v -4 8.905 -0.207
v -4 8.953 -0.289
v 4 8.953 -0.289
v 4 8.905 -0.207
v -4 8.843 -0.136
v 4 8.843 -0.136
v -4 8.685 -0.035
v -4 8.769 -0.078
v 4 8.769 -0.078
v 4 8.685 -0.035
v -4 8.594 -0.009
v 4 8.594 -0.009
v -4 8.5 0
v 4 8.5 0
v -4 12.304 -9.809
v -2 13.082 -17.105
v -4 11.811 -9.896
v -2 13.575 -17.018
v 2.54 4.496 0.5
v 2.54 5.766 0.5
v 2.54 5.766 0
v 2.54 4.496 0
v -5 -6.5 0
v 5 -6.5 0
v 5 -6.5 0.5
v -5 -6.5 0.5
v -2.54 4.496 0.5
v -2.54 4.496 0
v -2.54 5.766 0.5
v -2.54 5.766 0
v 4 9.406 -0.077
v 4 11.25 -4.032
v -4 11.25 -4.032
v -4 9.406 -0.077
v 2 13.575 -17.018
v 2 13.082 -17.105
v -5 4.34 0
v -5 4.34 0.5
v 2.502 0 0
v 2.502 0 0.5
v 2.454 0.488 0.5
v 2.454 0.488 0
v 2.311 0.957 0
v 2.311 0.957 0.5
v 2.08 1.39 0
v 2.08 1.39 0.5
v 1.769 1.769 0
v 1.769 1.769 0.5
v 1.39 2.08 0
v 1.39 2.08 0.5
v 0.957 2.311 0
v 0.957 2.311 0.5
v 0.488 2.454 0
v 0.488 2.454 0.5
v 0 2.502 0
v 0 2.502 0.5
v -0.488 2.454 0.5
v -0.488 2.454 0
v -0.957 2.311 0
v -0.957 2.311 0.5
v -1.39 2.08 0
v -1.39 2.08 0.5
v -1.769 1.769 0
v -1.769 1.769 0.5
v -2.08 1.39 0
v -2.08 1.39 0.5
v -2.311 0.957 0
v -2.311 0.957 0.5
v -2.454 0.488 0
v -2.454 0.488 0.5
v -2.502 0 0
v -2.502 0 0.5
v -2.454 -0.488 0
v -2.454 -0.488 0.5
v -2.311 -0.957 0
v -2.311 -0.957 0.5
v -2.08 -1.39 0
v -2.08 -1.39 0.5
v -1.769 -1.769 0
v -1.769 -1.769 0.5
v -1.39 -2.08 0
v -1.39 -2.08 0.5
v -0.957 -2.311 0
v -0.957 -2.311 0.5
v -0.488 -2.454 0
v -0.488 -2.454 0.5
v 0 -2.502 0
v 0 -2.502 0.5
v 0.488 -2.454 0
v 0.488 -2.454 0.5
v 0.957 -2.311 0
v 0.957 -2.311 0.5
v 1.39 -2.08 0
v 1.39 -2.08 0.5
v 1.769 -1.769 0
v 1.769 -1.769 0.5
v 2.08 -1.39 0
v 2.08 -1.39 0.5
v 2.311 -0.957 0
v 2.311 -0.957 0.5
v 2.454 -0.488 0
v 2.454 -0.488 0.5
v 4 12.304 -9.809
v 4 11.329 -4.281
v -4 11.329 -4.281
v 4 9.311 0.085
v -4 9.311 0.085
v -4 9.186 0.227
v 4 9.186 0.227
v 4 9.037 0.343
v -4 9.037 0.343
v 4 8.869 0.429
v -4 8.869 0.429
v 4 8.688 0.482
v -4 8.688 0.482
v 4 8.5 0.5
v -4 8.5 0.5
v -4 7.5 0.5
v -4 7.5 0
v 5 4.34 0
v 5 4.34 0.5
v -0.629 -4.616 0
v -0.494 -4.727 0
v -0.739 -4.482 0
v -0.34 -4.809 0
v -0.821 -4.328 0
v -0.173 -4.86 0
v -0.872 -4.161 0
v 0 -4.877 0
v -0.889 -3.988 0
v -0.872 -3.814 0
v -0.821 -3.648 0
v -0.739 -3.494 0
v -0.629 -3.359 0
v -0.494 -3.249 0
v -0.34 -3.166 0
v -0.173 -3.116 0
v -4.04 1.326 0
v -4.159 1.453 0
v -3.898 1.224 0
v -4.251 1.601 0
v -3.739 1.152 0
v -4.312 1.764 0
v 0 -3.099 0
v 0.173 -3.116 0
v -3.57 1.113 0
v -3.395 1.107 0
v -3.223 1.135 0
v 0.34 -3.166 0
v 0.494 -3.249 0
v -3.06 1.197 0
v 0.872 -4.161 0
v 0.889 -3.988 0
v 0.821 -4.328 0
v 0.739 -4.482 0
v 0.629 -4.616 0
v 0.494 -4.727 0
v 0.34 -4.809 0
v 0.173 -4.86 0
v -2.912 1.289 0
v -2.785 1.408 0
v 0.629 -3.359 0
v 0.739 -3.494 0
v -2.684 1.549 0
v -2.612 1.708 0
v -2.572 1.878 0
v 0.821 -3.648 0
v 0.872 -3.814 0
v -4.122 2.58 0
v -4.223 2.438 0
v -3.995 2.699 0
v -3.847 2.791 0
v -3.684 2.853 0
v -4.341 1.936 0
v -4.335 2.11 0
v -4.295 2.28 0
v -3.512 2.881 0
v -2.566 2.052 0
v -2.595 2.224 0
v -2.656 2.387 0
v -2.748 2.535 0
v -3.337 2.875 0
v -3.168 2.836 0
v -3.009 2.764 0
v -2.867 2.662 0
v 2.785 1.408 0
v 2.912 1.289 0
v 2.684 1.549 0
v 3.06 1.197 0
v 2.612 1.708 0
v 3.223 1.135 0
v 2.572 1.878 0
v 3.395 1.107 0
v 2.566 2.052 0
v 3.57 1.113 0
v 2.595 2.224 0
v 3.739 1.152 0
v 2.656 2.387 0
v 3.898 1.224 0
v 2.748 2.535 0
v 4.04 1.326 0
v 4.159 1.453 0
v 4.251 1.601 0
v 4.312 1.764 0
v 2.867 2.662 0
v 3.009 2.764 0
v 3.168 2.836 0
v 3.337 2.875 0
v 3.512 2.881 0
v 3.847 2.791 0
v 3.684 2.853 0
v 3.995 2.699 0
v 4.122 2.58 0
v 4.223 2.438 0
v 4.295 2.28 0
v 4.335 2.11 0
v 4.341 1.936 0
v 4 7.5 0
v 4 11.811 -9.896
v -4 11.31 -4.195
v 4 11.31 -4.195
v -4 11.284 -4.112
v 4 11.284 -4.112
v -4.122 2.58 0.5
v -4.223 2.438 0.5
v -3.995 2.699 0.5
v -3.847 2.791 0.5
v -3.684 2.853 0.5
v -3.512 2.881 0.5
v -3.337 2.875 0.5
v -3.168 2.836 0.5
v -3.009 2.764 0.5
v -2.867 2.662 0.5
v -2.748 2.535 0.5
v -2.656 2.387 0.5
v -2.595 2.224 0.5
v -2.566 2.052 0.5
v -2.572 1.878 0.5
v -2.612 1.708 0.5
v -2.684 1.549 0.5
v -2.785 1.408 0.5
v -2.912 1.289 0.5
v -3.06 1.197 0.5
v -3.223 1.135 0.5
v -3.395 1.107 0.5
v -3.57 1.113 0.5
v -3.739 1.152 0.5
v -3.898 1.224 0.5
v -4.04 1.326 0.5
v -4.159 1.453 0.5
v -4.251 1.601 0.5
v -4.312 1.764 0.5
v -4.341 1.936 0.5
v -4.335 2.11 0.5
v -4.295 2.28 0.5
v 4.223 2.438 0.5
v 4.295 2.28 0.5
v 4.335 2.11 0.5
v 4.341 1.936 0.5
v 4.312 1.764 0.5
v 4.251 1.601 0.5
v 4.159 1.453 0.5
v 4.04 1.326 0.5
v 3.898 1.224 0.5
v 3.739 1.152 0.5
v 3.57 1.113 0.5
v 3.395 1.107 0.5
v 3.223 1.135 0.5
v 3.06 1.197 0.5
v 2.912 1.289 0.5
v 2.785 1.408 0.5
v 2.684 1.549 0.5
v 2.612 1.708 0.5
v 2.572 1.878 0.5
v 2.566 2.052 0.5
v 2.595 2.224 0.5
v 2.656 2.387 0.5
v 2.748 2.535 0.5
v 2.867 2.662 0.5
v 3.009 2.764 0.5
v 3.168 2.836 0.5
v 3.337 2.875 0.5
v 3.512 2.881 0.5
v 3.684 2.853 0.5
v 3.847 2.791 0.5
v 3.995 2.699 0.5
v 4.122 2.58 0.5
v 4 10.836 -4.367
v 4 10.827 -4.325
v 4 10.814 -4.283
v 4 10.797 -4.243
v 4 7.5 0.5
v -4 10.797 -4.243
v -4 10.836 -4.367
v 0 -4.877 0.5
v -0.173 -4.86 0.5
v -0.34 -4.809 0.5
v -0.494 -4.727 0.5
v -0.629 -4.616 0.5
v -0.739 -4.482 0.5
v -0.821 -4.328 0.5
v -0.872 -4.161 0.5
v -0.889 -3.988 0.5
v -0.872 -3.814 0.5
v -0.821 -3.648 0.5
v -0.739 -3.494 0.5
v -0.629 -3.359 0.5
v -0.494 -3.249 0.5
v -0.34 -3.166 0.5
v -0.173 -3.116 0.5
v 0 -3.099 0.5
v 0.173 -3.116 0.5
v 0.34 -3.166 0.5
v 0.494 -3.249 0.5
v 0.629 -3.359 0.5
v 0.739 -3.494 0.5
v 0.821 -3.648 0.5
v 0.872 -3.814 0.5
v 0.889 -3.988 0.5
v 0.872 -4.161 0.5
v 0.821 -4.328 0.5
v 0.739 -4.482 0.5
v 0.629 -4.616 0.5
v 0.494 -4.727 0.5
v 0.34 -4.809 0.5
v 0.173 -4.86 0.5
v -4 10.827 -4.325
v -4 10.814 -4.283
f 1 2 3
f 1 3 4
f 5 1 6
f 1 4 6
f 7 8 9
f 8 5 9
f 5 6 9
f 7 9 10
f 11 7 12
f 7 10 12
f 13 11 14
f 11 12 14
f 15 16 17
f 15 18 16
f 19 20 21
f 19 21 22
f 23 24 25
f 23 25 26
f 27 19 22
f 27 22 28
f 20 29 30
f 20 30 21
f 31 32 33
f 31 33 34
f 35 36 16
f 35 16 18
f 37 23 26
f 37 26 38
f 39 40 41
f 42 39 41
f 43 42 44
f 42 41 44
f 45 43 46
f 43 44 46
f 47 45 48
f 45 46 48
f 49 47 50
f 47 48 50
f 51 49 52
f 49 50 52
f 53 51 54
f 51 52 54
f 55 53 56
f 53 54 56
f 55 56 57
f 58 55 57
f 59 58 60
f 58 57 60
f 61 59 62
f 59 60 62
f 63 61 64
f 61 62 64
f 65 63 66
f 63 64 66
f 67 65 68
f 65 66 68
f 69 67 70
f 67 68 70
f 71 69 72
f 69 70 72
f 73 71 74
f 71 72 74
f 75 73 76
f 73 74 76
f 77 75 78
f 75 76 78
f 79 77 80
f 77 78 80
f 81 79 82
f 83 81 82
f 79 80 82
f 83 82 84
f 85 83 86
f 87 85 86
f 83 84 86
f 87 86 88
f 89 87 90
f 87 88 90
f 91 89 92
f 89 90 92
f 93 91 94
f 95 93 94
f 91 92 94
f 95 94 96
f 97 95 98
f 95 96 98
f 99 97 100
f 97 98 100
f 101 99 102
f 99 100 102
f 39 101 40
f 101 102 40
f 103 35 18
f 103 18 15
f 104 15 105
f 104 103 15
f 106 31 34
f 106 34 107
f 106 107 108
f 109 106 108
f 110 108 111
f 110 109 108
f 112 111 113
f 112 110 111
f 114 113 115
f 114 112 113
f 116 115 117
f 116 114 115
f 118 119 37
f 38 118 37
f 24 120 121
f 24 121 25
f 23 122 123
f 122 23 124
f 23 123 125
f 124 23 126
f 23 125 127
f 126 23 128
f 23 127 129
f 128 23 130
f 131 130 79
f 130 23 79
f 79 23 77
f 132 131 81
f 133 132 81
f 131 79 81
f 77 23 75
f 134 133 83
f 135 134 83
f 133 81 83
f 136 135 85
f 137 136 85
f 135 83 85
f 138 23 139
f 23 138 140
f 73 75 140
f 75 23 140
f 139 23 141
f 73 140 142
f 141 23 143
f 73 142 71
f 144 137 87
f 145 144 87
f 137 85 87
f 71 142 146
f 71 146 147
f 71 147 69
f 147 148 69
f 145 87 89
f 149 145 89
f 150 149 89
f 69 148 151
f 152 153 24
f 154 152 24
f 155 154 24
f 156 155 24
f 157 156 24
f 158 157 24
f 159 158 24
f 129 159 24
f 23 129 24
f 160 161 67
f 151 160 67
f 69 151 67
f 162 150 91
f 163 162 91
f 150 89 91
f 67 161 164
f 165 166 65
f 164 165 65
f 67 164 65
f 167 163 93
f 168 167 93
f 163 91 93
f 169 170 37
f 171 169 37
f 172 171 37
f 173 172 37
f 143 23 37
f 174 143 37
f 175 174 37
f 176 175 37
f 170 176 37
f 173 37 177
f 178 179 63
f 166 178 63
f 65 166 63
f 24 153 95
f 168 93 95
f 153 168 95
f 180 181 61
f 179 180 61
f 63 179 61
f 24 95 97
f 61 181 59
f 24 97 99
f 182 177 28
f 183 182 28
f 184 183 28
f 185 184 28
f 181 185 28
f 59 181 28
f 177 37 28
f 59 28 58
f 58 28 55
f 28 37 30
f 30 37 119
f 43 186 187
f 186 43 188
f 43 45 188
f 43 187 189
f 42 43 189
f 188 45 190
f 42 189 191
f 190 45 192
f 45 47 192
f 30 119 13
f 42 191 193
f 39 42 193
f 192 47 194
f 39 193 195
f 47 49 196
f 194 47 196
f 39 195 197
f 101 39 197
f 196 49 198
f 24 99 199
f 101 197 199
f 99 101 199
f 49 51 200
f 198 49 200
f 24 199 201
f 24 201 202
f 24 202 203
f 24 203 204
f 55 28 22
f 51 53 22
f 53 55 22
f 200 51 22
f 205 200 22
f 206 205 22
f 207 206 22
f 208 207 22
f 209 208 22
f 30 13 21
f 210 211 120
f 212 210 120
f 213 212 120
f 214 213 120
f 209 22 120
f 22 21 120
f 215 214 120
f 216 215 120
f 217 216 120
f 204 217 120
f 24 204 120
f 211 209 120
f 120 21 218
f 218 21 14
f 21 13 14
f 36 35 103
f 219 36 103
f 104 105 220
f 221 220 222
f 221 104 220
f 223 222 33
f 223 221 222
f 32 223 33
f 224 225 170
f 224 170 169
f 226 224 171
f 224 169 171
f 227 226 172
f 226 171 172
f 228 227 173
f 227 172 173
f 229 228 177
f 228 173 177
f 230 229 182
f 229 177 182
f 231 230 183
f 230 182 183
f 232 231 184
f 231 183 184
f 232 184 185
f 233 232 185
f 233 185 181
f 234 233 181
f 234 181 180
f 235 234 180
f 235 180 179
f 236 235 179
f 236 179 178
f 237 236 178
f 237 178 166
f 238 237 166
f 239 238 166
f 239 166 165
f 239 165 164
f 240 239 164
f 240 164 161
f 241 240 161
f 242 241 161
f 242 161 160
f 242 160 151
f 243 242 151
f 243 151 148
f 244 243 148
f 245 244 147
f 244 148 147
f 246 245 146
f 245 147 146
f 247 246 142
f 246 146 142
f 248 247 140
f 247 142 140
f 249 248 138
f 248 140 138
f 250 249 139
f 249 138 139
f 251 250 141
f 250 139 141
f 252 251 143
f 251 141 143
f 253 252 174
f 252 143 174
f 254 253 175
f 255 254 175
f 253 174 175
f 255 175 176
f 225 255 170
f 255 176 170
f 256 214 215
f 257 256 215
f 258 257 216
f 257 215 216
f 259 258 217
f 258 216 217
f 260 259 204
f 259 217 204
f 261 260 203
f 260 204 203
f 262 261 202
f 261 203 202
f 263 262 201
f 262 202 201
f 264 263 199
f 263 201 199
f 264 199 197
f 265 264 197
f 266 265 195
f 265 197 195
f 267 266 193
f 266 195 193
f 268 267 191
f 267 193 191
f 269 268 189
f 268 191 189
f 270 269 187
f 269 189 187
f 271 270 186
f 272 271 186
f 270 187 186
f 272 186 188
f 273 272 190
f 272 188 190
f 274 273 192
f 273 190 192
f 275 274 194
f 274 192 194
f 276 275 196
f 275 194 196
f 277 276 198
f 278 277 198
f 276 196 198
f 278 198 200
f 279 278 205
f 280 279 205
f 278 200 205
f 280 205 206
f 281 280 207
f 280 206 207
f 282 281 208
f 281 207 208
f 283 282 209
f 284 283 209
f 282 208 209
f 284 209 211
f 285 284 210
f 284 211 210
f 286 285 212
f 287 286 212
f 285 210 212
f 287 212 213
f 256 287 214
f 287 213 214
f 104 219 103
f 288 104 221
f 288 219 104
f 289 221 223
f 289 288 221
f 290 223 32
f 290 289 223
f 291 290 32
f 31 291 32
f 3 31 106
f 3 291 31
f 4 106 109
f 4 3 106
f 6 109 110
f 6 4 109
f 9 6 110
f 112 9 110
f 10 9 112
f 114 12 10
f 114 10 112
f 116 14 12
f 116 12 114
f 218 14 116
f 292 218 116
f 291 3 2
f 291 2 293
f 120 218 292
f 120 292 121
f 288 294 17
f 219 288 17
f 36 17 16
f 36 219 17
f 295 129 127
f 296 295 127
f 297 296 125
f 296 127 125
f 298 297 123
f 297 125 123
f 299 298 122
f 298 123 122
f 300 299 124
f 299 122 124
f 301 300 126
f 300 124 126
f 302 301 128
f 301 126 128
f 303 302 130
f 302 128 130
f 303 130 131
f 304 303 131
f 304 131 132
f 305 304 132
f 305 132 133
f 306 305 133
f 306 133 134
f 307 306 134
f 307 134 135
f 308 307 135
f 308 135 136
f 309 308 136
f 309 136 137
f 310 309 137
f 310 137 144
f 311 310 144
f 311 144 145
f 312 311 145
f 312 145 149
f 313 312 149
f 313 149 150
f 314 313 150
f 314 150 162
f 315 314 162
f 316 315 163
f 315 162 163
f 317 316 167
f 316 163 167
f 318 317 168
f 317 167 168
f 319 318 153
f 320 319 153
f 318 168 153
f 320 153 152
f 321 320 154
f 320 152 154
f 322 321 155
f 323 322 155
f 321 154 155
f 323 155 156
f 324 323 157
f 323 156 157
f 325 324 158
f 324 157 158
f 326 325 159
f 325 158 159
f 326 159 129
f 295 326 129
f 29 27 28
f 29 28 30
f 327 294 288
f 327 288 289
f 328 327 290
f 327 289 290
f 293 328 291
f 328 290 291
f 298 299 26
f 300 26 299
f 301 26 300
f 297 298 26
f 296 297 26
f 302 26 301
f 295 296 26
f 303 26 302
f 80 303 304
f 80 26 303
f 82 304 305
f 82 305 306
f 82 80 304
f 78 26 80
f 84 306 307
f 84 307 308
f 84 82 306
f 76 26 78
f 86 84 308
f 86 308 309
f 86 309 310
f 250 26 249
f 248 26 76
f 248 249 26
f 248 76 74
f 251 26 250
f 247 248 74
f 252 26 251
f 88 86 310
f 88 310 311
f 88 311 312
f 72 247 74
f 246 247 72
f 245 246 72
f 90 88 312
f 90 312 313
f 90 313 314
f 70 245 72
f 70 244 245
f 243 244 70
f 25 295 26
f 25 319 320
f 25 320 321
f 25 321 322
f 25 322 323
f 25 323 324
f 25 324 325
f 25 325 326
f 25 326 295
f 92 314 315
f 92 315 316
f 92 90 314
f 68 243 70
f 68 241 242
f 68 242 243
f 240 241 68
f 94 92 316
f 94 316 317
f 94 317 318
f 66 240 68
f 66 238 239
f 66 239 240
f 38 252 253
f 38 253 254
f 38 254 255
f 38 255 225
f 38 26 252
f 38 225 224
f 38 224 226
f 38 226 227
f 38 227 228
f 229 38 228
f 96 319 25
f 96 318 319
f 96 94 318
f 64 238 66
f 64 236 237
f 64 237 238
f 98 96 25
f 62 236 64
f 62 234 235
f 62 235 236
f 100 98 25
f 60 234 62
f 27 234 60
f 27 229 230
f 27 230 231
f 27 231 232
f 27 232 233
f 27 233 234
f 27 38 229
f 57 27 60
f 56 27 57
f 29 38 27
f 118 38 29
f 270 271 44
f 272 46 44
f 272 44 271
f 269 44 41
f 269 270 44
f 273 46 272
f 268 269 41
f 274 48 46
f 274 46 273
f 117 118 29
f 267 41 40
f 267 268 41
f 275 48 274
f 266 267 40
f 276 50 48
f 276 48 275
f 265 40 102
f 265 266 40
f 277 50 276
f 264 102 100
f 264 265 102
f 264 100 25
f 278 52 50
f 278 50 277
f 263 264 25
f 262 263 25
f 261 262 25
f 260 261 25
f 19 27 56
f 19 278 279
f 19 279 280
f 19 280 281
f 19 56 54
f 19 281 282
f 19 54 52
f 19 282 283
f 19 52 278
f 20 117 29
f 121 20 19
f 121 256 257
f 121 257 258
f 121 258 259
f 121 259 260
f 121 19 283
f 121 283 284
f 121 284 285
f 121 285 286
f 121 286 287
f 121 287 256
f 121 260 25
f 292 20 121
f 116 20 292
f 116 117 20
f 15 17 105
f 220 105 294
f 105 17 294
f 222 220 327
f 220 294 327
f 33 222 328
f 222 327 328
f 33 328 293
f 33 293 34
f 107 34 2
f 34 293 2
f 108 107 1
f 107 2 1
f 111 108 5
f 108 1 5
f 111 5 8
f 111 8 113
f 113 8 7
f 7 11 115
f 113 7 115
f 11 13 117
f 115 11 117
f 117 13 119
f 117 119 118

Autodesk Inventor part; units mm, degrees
ref_plane "YZ Plane" through (0, 0, 0) normal (1, 0, 0) x (0, 1, 0)
ref_plane "XZ Plane" through (0, 0, 0) normal (0, 1, 0) x (-1, 0, 0)
ref_plane "XY Plane" through (0, 0, 0) normal (0, 0, 1) x (1, 0, 0)
sketch "Sketch1" plane through (0, 0, 0) normal (0, 0, 1) x (1, 0, 0)
  line L0 (0, -9.5) -> (0, 11.5)
  line L1 (-4, 7.5) -> (4, 7.5)
  line L2 (4, 7.5) -> (4, 2.1599)
  line L3 (4, 2.1599) -> (-4, 2.1599)
  line L4 (-4, 2.1599) -> (-4, 7.5)
  line L5 (-7, 0) -> (7, 0)
  line L6 (-4, 7.5) -> (-5, 4.34)
  line L7 (4, 7.5) -> (5, 4.34)
  line L8 (-4, 4.34) -> (4, 4.34)
  line L9 (-5, -6.5) -> (-5, 4.34)
  line L10 (5, 4.34) -> (5, -6.5)
  line L11 (5, -6.5) -> (-5, -6.5)
  line L12 (-4, 7.5) -> (4, 7.5)
  line L13 (4, 7.5) -> (4, 8.5)
  line L14 (4, 8.5) -> (-4, 8.5)
  line L15 (-4, 8.5) -> (-4, 7.5)
  point P0 (0, 7.5)
  point P1 (0, 0)
  dimension "d6" = 8
  dimension "d9" = 10.84
  dimension "d40" = 7.5
  dimension "d41" = 8.5
extrude "Plate1" add sketch "Sketch1" along normal blind 0.5
sketch "Sketch2" plane through (0, 0, 0.5) normal (0, 0, 1) x (1, 0, 0)
  circle A0 centre (0, 0) radius 2.5019
  line L0 (0, -9.5) -> (0, 11.5) projected
  point P0 (0, -3.9878)
  dimension "d12" = 5.0038
  dimension "d69" = 3.9878
extrude "Cut1" cut sketch "Sketch2" against normal blind 0.5
hole "Hole1" at (0, -3.9878, 0.5) direction (0, 0, -1) diameter 1.778 end through all clearance for "Flat Head Machine Screw (82)" size "#0" standard "Ansi Unified Screw Threads"
pattern_circular "Circular Pattern1" count 3 over 360 about axis through (0, 0, -10) along (0, 0, 1) of "Hole1"
sketch "Sketch3" plane through (0, 0, 0.5) normal (0, 0, 1) x (1, 0, 0)
  circle A0 centre (0, 0) radius 2.5019 projected
  line L0 (-2.5, 5.334) -> (2.5, 5.334)
  line L1 (2.5, 5.334) -> (2.5, 4.572)
  line L2 (2.5, 4.572) -> (-2.5, 4.572)
  line L3 (-2.5, 4.572) -> (-2.5, 5.334)
  point P0 (0, 5.334)
  dimension "d25" = 5
  dimension "d26" = 0.762
  dimension "d27" = 5.334
cut "Cut2" [suppressed]
sketch "Sketch5" plane through (4, 8.9532, -0.2887) normal (0, 0.9063078, 0.4226183) x (-1, 0, 0)
  line L0 (8, 0) -> (0, 0)
  line L1 (0, 0) -> (0, -4.3629)
  line L2 (0, -4.3629) -> (8, -4.3629)
  line L3 (8, -4.3629) -> (8, 0)
edge flange "Flange2" height 5 angle 65 thickness 0.5 bend radius 0.5 thickness toward (0, 0.9063078, 0.4226183) relief tear relief width 0.5 relief depth 0.25 edges at (0, 8.5, 0) wall of the first edge with corners at (-4, 8.9532, -0.2887) (4, 8.9532, -0.2887) (4, 10.797, -4.2428) (-4, 10.797, -4.2428)
bend "Bend2"
corner "Corner2"
sketch "Sketch6" plane through (-4, 10.8363, -4.3673) normal (0, 0.9848078, 0.1736482) x (1, 0, 0)
  line L0 (8, 0) -> (0, 0)
  line L1 (0, 0) -> (0, -12.9342)
  line L2 (0, -12.9342) -> (8, -12.9342)
  line L3 (8, -12.9342) -> (8, 0)
edge flange "Flange3" height 13 angle -15 thickness 0.5 bend radius 0.5 thickness toward (0, 0.9848078, 0.1736482) relief tear relief width 0.5 relief depth 0.25 edges at (0, 11.2502, -4.0315) wall of the first edge with corners at (4, 10.8363, -4.3673) (-4, 10.8363, -4.3673) (-4, 13.0823, -17.105) (4, 13.0823, -17.105)
bend "Bend3"
corner "Corner3"
sketch "Sketch8" plane through (-4, 13.5747, -17.0182) normal (0, 0.9848078, 0.1736482) x (1, 0, 0)
  line L0 (0, -12.9342) -> (8, -12.9342) projected
  line L1 (8, -12.9342) -> (8, 0) projected
  line L2 (8, 0) -> (0, 0) projected
  line L3 (0, -12.9342) -> (0, 0) projected
  line L4 (2, 0) -> (6, 0)
  line L5 (6, 0) -> (6, -10.36)
  line L6 (6, -10.36) -> (2, -10.36)
  line L7 (2, -10.36) -> (2, 0)
  line L8 (4, 5.07) -> (4, -29.8212) projected
  line L9 (2, 0) -> (0, -7.32)
  line L10 (6, 0) -> (8, -7.32)
  line L11 (0, -7.32) -> (0, 0)
  line L12 (2, 0) -> (0, 0)
  line L13 (6, 0) -> (8, 0)
  line L14 (8, -7.32) -> (8, 0)
  point P0 (4, -19.1169)
  point P1 (4, 0)
  point P2 (4, 0)
  dimension "d63" = 4
  dimension "d64" = 7.32
  dimension "d65" = 12.9342
extrude "Cut3" cut sketch "Sketch8" against normal blind 0.5 contours L3 L2 L9 | L10 L2 L1
sketch "Sketch9" plane through (5, -6.5, 0) normal (1, 0, 0) x (0, 0, -1)
  line L0 (-0.5, 10.84) -> (-0.5, 0) projected
  line L1 (0, 0) -> (-0.5, 0) projected
  line L2 (0, 0) -> (0, 10.84) projected
  line L3 (0, 10.84) -> (-0.5, 10.84) projected
  line L4 (0.0774, 15.9063) -> (0.2887, 15.4532) projected
  arc A0 (0.0774, 15.9063) -> (-0.5, 15) centre (0.5, 15) ccw projected
  line L5 (0, 15) -> (-0.5, 15) projected
  arc A1 (0.2887, 15.4532) -> (0, 15) centre (0.5, 15) ccw projected
  line L6 (0, 14) -> (0, 15) projected
  line L7 (4.2805, 17.8287) -> (4.3673, 17.3363) projected
  arc A2 (4.2805, 17.8287) -> (4.0315, 17.7502) centre (4.4542, 16.8439) ccw projected
  line L8 (4.2428, 17.297) -> (4.0315, 17.7502) projected
  arc A3 (4.3673, 17.3363) -> (4.2428, 17.297) centre (4.4542, 16.8439) ccw projected
  line L9 (-0.5, 15) -> (15.0848, 17.748)
  line L10 (0.0774, 15.9063) -> (4.0315, 17.7502)
  point P0 (0, 6.5)
sketch "Sketch10" plane through (0, 0, 0.5) normal (0, 0, 1) x (1, 0, 0)
  circle A0 centre (0, 0) radius 2.5019 projected
  line L0 (-2.54, 5.7658) -> (2.54, 5.7658)
  line L1 (2.54, 5.7658) -> (2.54, 4.4958)
  line L2 (2.54, 4.4958) -> (-2.54, 4.4958)
  line L3 (-2.54, 4.4958) -> (-2.54, 5.7658)
  point P0 (0, 5.7658)
  dimension "d70" = 1.27
  dimension "d71" = 5.08
  dimension "d72" = 4.4958
extrude "Cut4" cut sketch "Sketch10" against normal blind 0.5 contours L0 L1 L2 L3
equation "\"d13\" = Thickness"
equation "\"d20\" = Thickness"
equation "\"d28\" = Thickness"
equation "\"d66\" = Thickness"
equation "\"d73\" = Thickness"
equation "\"d42\" = BendReliefWidth"
equation "\"d43\" = BendReliefDepth"
equation "\"d44\" = MinimumRemnant"
equation "\"d45\" = BendRadius"
equation "\"d48\" = BendRadius"
equation "\"d49\" = CornerReliefSize"
equation "\"d50\" = GapSize"
equation "\"d51\" = JacobiRadiusSize"
equation "\"d52\" = BendReliefWidth"
equation "\"d53\" = BendReliefDepth"
equation "\"d54\" = MinimumRemnant"
equation "\"d55\" = BendRadius"
equation "\"d58\" = BendRadius"
equation "\"d59\" = CornerReliefSize"
equation "\"d60\" = GapSize"
equation "\"d61\" = JacobiRadiusSize"
equation "\"BendRadius\" = Thickness"
equation "\"BendReliefWidth\" = Thickness"
equation "\"BendReliefDepth\" = 0.5 * Thickness"
equation "\"CornerReliefSize\" = 4 * Thickness"
equation "\"MinimumRemnant\" = 2 * Thickness"
equation "\"TransitionRadius\" = BendRadius"
equation "\"JacobiRadiusSize\" = BendRadius"
equation "\"GapSize\" = Thickness"
equation "\"d10\" = BendRadius"
equation "\"Thickness\" = 0.5"
properties part number "ASAP_Top_Fixture_New(o)"
